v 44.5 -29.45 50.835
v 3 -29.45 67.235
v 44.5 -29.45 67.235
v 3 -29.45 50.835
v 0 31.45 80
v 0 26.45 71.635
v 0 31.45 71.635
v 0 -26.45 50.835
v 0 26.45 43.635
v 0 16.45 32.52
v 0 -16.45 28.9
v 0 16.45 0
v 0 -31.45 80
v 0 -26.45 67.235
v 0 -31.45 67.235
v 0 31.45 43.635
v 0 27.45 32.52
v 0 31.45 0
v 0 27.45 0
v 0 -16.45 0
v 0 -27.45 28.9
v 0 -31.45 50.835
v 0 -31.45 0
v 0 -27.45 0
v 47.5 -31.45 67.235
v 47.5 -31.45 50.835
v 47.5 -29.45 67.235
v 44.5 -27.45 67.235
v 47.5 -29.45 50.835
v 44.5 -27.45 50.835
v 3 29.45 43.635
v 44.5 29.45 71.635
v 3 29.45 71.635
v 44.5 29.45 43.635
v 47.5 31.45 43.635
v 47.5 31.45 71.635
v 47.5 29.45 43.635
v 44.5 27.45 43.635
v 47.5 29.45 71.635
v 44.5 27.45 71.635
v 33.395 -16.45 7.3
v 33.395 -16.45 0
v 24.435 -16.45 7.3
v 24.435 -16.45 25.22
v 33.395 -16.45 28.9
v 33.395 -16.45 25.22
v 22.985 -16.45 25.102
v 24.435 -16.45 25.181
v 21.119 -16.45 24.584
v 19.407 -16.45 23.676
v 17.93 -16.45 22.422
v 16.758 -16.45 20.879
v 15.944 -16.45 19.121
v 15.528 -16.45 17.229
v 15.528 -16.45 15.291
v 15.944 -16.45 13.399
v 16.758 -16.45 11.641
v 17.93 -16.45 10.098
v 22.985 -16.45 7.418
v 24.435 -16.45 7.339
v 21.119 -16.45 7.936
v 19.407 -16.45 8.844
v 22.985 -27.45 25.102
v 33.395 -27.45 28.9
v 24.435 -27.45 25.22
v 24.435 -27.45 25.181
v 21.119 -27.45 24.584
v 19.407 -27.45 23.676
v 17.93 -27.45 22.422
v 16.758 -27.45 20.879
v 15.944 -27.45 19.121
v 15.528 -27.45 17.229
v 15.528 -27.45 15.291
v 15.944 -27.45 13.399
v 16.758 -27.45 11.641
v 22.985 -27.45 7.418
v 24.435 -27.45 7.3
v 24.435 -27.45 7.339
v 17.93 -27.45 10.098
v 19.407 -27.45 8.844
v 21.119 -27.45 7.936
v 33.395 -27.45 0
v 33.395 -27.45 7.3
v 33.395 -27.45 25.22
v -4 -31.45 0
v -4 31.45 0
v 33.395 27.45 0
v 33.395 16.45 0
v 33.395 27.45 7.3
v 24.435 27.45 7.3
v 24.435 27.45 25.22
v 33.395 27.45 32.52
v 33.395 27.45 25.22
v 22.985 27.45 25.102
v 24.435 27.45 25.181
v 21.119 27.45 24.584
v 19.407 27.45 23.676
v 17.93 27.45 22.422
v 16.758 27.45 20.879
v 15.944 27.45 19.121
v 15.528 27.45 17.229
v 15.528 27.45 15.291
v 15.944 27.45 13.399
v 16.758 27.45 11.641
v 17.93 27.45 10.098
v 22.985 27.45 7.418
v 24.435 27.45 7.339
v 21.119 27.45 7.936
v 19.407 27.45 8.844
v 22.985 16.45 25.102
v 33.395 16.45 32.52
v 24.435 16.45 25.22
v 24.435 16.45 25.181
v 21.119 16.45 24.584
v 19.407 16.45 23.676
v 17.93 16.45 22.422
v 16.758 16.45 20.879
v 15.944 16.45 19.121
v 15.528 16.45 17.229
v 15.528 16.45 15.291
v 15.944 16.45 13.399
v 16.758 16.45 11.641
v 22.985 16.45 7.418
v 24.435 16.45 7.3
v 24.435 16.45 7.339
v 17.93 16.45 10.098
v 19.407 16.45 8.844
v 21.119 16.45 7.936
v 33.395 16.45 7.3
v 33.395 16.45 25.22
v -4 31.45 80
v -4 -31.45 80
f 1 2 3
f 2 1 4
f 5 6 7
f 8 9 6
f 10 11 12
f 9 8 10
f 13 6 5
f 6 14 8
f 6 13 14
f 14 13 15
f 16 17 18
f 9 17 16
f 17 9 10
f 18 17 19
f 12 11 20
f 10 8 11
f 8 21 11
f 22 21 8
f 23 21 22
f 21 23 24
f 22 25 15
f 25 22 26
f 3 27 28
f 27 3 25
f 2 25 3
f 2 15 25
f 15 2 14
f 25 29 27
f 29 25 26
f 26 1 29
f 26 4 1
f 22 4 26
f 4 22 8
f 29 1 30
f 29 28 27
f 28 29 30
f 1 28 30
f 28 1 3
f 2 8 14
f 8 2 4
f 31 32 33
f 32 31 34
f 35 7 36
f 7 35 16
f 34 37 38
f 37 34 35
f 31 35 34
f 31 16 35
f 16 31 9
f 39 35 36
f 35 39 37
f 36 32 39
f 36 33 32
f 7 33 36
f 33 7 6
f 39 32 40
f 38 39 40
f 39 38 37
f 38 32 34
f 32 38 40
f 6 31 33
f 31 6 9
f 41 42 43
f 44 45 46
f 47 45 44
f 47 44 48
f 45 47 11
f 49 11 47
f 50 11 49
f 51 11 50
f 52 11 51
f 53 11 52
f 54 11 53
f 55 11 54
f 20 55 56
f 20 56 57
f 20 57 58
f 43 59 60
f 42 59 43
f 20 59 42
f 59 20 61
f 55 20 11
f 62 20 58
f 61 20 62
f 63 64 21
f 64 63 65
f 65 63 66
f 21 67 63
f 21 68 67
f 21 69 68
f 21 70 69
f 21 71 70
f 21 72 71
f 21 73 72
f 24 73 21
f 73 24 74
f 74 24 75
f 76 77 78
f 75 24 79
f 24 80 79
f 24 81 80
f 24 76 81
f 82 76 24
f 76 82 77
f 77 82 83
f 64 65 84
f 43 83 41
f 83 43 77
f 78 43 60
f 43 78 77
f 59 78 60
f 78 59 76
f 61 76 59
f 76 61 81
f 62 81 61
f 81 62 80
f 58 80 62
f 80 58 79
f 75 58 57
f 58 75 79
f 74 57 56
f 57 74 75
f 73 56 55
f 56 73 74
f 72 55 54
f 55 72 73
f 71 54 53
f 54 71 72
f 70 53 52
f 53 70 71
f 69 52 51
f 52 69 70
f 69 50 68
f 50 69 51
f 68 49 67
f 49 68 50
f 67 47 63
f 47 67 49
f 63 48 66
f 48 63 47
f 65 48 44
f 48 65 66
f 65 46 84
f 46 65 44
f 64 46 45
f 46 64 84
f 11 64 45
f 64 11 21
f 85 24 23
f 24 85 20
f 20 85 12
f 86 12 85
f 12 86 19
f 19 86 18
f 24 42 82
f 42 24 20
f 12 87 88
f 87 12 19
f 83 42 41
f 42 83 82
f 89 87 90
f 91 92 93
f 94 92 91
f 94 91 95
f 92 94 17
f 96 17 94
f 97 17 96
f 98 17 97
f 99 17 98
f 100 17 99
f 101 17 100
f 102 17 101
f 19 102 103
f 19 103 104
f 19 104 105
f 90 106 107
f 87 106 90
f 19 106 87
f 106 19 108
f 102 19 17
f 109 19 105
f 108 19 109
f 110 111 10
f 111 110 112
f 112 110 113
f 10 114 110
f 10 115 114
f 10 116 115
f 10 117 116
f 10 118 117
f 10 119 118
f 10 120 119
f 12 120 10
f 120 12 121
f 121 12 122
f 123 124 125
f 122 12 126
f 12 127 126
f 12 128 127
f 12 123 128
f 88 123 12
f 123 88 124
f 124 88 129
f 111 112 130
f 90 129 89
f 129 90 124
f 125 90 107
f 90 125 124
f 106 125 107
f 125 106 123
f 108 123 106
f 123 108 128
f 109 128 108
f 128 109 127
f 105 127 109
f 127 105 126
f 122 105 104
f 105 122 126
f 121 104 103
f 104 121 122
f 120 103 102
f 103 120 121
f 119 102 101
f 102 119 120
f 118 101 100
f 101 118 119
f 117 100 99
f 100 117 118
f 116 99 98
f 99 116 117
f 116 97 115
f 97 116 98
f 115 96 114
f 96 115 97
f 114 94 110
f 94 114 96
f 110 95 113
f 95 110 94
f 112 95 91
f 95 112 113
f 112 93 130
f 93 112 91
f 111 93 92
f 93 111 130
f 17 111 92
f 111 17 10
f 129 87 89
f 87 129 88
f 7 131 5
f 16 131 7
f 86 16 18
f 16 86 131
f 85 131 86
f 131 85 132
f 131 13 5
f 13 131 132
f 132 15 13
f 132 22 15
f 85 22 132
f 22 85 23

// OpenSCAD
plateThickness = 4;
upperArmThickness = 2;
lowerArmThickness = 11;
upperArmSpacing = 58.8;
plateHeight = 80;
bumpSize = 2;
upperArmHorizontalSpacing = 58.9;
upperCatchLength = 3;
upperCatchThickness = 2;
lowerArmHorizontalInset = 2;
upperArmMainLength = 44.5;
upperArmGusset = 3;

plateWidth = upperArmHorizontalSpacing + 2 * upperArmThickness;

rodDiameter = 8.15;
rodInset = 11.4 + rodDiameter/2;
rodCatchDiameter = 17.92;
lowerArmLength = rodInset+rodCatchDiameter;
lowerArmHeight = 2*7.3+rodCatchDiameter;
rodTopZ = lowerArmHeight - rodCatchDiameter / 2 + rodDiameter / 2;

//projection() 
//rotate([90,0,0])
{
// backplate
translate([0,-plateWidth/2,0]) rotate([0,-90,0]) linear_extrude(height=plateThickness) square([plateHeight,plateWidth]);

// loop over two sides
for (i=[0:1]) {
    sign = i * 2 - 1;
    // left: i = 0, sign = -1
    // right: i = 1, sign = 1
    upperArmHeight = (i==0) ? 16.4 : 28;
    upperArmStartZ = rodTopZ + ( (i==0) ? 23.2 : 16 )   ;

    // upper arm: TODO catches
    translate([0,sign*(plateWidth/2-upperArmThickness/2),upperArmStartZ+upperArmHeight/2]) 
    rotate([-sign*90,0,0]) 
        translate([0,-upperArmHeight/2,-upperArmThickness/2]) 
        union() {
        linear_extrude(height=upperArmThickness) 
            square([upperArmMainLength+upperCatchLength, upperArmHeight]);
        translate([upperArmMainLength,0,0])
            rotate([-90,0,0])
            linear_extrude(height=upperArmHeight)
            polygon(points=[[0,upperCatchThickness],[upperCatchLength,0],[0,0]]);
        rotate([-90,0,0])
            linear_extrude(height=upperArmHeight)
            polygon(points=[[0,upperArmGusset],[upperArmGusset,0],[0,0]]);
        }
    armHeightAdjustment = (i==0) ? (7.3-3.68) : 0;
    translate([0,sign*(upperArmHorizontalSpacing/2-lowerArmHorizontalInset-lowerArmThickness/2),0]) rotate([90,0,0]) translate([0,0,-lowerArmThickness/2]) linear_extrude(height=lowerArmThickness) 
    difference() {
        square([lowerArmLength, lowerArmHeight-armHeightAdjustment]);
        translate([rodInset+rodCatchDiameter/2,lowerArmHeight/2]) union() {
            circle(r=rodCatchDiameter/2);
            translate([rodCatchDiameter/2,0]) square([rodCatchDiameter,rodCatchDiameter],center=true);
        }
    }
}  

}
